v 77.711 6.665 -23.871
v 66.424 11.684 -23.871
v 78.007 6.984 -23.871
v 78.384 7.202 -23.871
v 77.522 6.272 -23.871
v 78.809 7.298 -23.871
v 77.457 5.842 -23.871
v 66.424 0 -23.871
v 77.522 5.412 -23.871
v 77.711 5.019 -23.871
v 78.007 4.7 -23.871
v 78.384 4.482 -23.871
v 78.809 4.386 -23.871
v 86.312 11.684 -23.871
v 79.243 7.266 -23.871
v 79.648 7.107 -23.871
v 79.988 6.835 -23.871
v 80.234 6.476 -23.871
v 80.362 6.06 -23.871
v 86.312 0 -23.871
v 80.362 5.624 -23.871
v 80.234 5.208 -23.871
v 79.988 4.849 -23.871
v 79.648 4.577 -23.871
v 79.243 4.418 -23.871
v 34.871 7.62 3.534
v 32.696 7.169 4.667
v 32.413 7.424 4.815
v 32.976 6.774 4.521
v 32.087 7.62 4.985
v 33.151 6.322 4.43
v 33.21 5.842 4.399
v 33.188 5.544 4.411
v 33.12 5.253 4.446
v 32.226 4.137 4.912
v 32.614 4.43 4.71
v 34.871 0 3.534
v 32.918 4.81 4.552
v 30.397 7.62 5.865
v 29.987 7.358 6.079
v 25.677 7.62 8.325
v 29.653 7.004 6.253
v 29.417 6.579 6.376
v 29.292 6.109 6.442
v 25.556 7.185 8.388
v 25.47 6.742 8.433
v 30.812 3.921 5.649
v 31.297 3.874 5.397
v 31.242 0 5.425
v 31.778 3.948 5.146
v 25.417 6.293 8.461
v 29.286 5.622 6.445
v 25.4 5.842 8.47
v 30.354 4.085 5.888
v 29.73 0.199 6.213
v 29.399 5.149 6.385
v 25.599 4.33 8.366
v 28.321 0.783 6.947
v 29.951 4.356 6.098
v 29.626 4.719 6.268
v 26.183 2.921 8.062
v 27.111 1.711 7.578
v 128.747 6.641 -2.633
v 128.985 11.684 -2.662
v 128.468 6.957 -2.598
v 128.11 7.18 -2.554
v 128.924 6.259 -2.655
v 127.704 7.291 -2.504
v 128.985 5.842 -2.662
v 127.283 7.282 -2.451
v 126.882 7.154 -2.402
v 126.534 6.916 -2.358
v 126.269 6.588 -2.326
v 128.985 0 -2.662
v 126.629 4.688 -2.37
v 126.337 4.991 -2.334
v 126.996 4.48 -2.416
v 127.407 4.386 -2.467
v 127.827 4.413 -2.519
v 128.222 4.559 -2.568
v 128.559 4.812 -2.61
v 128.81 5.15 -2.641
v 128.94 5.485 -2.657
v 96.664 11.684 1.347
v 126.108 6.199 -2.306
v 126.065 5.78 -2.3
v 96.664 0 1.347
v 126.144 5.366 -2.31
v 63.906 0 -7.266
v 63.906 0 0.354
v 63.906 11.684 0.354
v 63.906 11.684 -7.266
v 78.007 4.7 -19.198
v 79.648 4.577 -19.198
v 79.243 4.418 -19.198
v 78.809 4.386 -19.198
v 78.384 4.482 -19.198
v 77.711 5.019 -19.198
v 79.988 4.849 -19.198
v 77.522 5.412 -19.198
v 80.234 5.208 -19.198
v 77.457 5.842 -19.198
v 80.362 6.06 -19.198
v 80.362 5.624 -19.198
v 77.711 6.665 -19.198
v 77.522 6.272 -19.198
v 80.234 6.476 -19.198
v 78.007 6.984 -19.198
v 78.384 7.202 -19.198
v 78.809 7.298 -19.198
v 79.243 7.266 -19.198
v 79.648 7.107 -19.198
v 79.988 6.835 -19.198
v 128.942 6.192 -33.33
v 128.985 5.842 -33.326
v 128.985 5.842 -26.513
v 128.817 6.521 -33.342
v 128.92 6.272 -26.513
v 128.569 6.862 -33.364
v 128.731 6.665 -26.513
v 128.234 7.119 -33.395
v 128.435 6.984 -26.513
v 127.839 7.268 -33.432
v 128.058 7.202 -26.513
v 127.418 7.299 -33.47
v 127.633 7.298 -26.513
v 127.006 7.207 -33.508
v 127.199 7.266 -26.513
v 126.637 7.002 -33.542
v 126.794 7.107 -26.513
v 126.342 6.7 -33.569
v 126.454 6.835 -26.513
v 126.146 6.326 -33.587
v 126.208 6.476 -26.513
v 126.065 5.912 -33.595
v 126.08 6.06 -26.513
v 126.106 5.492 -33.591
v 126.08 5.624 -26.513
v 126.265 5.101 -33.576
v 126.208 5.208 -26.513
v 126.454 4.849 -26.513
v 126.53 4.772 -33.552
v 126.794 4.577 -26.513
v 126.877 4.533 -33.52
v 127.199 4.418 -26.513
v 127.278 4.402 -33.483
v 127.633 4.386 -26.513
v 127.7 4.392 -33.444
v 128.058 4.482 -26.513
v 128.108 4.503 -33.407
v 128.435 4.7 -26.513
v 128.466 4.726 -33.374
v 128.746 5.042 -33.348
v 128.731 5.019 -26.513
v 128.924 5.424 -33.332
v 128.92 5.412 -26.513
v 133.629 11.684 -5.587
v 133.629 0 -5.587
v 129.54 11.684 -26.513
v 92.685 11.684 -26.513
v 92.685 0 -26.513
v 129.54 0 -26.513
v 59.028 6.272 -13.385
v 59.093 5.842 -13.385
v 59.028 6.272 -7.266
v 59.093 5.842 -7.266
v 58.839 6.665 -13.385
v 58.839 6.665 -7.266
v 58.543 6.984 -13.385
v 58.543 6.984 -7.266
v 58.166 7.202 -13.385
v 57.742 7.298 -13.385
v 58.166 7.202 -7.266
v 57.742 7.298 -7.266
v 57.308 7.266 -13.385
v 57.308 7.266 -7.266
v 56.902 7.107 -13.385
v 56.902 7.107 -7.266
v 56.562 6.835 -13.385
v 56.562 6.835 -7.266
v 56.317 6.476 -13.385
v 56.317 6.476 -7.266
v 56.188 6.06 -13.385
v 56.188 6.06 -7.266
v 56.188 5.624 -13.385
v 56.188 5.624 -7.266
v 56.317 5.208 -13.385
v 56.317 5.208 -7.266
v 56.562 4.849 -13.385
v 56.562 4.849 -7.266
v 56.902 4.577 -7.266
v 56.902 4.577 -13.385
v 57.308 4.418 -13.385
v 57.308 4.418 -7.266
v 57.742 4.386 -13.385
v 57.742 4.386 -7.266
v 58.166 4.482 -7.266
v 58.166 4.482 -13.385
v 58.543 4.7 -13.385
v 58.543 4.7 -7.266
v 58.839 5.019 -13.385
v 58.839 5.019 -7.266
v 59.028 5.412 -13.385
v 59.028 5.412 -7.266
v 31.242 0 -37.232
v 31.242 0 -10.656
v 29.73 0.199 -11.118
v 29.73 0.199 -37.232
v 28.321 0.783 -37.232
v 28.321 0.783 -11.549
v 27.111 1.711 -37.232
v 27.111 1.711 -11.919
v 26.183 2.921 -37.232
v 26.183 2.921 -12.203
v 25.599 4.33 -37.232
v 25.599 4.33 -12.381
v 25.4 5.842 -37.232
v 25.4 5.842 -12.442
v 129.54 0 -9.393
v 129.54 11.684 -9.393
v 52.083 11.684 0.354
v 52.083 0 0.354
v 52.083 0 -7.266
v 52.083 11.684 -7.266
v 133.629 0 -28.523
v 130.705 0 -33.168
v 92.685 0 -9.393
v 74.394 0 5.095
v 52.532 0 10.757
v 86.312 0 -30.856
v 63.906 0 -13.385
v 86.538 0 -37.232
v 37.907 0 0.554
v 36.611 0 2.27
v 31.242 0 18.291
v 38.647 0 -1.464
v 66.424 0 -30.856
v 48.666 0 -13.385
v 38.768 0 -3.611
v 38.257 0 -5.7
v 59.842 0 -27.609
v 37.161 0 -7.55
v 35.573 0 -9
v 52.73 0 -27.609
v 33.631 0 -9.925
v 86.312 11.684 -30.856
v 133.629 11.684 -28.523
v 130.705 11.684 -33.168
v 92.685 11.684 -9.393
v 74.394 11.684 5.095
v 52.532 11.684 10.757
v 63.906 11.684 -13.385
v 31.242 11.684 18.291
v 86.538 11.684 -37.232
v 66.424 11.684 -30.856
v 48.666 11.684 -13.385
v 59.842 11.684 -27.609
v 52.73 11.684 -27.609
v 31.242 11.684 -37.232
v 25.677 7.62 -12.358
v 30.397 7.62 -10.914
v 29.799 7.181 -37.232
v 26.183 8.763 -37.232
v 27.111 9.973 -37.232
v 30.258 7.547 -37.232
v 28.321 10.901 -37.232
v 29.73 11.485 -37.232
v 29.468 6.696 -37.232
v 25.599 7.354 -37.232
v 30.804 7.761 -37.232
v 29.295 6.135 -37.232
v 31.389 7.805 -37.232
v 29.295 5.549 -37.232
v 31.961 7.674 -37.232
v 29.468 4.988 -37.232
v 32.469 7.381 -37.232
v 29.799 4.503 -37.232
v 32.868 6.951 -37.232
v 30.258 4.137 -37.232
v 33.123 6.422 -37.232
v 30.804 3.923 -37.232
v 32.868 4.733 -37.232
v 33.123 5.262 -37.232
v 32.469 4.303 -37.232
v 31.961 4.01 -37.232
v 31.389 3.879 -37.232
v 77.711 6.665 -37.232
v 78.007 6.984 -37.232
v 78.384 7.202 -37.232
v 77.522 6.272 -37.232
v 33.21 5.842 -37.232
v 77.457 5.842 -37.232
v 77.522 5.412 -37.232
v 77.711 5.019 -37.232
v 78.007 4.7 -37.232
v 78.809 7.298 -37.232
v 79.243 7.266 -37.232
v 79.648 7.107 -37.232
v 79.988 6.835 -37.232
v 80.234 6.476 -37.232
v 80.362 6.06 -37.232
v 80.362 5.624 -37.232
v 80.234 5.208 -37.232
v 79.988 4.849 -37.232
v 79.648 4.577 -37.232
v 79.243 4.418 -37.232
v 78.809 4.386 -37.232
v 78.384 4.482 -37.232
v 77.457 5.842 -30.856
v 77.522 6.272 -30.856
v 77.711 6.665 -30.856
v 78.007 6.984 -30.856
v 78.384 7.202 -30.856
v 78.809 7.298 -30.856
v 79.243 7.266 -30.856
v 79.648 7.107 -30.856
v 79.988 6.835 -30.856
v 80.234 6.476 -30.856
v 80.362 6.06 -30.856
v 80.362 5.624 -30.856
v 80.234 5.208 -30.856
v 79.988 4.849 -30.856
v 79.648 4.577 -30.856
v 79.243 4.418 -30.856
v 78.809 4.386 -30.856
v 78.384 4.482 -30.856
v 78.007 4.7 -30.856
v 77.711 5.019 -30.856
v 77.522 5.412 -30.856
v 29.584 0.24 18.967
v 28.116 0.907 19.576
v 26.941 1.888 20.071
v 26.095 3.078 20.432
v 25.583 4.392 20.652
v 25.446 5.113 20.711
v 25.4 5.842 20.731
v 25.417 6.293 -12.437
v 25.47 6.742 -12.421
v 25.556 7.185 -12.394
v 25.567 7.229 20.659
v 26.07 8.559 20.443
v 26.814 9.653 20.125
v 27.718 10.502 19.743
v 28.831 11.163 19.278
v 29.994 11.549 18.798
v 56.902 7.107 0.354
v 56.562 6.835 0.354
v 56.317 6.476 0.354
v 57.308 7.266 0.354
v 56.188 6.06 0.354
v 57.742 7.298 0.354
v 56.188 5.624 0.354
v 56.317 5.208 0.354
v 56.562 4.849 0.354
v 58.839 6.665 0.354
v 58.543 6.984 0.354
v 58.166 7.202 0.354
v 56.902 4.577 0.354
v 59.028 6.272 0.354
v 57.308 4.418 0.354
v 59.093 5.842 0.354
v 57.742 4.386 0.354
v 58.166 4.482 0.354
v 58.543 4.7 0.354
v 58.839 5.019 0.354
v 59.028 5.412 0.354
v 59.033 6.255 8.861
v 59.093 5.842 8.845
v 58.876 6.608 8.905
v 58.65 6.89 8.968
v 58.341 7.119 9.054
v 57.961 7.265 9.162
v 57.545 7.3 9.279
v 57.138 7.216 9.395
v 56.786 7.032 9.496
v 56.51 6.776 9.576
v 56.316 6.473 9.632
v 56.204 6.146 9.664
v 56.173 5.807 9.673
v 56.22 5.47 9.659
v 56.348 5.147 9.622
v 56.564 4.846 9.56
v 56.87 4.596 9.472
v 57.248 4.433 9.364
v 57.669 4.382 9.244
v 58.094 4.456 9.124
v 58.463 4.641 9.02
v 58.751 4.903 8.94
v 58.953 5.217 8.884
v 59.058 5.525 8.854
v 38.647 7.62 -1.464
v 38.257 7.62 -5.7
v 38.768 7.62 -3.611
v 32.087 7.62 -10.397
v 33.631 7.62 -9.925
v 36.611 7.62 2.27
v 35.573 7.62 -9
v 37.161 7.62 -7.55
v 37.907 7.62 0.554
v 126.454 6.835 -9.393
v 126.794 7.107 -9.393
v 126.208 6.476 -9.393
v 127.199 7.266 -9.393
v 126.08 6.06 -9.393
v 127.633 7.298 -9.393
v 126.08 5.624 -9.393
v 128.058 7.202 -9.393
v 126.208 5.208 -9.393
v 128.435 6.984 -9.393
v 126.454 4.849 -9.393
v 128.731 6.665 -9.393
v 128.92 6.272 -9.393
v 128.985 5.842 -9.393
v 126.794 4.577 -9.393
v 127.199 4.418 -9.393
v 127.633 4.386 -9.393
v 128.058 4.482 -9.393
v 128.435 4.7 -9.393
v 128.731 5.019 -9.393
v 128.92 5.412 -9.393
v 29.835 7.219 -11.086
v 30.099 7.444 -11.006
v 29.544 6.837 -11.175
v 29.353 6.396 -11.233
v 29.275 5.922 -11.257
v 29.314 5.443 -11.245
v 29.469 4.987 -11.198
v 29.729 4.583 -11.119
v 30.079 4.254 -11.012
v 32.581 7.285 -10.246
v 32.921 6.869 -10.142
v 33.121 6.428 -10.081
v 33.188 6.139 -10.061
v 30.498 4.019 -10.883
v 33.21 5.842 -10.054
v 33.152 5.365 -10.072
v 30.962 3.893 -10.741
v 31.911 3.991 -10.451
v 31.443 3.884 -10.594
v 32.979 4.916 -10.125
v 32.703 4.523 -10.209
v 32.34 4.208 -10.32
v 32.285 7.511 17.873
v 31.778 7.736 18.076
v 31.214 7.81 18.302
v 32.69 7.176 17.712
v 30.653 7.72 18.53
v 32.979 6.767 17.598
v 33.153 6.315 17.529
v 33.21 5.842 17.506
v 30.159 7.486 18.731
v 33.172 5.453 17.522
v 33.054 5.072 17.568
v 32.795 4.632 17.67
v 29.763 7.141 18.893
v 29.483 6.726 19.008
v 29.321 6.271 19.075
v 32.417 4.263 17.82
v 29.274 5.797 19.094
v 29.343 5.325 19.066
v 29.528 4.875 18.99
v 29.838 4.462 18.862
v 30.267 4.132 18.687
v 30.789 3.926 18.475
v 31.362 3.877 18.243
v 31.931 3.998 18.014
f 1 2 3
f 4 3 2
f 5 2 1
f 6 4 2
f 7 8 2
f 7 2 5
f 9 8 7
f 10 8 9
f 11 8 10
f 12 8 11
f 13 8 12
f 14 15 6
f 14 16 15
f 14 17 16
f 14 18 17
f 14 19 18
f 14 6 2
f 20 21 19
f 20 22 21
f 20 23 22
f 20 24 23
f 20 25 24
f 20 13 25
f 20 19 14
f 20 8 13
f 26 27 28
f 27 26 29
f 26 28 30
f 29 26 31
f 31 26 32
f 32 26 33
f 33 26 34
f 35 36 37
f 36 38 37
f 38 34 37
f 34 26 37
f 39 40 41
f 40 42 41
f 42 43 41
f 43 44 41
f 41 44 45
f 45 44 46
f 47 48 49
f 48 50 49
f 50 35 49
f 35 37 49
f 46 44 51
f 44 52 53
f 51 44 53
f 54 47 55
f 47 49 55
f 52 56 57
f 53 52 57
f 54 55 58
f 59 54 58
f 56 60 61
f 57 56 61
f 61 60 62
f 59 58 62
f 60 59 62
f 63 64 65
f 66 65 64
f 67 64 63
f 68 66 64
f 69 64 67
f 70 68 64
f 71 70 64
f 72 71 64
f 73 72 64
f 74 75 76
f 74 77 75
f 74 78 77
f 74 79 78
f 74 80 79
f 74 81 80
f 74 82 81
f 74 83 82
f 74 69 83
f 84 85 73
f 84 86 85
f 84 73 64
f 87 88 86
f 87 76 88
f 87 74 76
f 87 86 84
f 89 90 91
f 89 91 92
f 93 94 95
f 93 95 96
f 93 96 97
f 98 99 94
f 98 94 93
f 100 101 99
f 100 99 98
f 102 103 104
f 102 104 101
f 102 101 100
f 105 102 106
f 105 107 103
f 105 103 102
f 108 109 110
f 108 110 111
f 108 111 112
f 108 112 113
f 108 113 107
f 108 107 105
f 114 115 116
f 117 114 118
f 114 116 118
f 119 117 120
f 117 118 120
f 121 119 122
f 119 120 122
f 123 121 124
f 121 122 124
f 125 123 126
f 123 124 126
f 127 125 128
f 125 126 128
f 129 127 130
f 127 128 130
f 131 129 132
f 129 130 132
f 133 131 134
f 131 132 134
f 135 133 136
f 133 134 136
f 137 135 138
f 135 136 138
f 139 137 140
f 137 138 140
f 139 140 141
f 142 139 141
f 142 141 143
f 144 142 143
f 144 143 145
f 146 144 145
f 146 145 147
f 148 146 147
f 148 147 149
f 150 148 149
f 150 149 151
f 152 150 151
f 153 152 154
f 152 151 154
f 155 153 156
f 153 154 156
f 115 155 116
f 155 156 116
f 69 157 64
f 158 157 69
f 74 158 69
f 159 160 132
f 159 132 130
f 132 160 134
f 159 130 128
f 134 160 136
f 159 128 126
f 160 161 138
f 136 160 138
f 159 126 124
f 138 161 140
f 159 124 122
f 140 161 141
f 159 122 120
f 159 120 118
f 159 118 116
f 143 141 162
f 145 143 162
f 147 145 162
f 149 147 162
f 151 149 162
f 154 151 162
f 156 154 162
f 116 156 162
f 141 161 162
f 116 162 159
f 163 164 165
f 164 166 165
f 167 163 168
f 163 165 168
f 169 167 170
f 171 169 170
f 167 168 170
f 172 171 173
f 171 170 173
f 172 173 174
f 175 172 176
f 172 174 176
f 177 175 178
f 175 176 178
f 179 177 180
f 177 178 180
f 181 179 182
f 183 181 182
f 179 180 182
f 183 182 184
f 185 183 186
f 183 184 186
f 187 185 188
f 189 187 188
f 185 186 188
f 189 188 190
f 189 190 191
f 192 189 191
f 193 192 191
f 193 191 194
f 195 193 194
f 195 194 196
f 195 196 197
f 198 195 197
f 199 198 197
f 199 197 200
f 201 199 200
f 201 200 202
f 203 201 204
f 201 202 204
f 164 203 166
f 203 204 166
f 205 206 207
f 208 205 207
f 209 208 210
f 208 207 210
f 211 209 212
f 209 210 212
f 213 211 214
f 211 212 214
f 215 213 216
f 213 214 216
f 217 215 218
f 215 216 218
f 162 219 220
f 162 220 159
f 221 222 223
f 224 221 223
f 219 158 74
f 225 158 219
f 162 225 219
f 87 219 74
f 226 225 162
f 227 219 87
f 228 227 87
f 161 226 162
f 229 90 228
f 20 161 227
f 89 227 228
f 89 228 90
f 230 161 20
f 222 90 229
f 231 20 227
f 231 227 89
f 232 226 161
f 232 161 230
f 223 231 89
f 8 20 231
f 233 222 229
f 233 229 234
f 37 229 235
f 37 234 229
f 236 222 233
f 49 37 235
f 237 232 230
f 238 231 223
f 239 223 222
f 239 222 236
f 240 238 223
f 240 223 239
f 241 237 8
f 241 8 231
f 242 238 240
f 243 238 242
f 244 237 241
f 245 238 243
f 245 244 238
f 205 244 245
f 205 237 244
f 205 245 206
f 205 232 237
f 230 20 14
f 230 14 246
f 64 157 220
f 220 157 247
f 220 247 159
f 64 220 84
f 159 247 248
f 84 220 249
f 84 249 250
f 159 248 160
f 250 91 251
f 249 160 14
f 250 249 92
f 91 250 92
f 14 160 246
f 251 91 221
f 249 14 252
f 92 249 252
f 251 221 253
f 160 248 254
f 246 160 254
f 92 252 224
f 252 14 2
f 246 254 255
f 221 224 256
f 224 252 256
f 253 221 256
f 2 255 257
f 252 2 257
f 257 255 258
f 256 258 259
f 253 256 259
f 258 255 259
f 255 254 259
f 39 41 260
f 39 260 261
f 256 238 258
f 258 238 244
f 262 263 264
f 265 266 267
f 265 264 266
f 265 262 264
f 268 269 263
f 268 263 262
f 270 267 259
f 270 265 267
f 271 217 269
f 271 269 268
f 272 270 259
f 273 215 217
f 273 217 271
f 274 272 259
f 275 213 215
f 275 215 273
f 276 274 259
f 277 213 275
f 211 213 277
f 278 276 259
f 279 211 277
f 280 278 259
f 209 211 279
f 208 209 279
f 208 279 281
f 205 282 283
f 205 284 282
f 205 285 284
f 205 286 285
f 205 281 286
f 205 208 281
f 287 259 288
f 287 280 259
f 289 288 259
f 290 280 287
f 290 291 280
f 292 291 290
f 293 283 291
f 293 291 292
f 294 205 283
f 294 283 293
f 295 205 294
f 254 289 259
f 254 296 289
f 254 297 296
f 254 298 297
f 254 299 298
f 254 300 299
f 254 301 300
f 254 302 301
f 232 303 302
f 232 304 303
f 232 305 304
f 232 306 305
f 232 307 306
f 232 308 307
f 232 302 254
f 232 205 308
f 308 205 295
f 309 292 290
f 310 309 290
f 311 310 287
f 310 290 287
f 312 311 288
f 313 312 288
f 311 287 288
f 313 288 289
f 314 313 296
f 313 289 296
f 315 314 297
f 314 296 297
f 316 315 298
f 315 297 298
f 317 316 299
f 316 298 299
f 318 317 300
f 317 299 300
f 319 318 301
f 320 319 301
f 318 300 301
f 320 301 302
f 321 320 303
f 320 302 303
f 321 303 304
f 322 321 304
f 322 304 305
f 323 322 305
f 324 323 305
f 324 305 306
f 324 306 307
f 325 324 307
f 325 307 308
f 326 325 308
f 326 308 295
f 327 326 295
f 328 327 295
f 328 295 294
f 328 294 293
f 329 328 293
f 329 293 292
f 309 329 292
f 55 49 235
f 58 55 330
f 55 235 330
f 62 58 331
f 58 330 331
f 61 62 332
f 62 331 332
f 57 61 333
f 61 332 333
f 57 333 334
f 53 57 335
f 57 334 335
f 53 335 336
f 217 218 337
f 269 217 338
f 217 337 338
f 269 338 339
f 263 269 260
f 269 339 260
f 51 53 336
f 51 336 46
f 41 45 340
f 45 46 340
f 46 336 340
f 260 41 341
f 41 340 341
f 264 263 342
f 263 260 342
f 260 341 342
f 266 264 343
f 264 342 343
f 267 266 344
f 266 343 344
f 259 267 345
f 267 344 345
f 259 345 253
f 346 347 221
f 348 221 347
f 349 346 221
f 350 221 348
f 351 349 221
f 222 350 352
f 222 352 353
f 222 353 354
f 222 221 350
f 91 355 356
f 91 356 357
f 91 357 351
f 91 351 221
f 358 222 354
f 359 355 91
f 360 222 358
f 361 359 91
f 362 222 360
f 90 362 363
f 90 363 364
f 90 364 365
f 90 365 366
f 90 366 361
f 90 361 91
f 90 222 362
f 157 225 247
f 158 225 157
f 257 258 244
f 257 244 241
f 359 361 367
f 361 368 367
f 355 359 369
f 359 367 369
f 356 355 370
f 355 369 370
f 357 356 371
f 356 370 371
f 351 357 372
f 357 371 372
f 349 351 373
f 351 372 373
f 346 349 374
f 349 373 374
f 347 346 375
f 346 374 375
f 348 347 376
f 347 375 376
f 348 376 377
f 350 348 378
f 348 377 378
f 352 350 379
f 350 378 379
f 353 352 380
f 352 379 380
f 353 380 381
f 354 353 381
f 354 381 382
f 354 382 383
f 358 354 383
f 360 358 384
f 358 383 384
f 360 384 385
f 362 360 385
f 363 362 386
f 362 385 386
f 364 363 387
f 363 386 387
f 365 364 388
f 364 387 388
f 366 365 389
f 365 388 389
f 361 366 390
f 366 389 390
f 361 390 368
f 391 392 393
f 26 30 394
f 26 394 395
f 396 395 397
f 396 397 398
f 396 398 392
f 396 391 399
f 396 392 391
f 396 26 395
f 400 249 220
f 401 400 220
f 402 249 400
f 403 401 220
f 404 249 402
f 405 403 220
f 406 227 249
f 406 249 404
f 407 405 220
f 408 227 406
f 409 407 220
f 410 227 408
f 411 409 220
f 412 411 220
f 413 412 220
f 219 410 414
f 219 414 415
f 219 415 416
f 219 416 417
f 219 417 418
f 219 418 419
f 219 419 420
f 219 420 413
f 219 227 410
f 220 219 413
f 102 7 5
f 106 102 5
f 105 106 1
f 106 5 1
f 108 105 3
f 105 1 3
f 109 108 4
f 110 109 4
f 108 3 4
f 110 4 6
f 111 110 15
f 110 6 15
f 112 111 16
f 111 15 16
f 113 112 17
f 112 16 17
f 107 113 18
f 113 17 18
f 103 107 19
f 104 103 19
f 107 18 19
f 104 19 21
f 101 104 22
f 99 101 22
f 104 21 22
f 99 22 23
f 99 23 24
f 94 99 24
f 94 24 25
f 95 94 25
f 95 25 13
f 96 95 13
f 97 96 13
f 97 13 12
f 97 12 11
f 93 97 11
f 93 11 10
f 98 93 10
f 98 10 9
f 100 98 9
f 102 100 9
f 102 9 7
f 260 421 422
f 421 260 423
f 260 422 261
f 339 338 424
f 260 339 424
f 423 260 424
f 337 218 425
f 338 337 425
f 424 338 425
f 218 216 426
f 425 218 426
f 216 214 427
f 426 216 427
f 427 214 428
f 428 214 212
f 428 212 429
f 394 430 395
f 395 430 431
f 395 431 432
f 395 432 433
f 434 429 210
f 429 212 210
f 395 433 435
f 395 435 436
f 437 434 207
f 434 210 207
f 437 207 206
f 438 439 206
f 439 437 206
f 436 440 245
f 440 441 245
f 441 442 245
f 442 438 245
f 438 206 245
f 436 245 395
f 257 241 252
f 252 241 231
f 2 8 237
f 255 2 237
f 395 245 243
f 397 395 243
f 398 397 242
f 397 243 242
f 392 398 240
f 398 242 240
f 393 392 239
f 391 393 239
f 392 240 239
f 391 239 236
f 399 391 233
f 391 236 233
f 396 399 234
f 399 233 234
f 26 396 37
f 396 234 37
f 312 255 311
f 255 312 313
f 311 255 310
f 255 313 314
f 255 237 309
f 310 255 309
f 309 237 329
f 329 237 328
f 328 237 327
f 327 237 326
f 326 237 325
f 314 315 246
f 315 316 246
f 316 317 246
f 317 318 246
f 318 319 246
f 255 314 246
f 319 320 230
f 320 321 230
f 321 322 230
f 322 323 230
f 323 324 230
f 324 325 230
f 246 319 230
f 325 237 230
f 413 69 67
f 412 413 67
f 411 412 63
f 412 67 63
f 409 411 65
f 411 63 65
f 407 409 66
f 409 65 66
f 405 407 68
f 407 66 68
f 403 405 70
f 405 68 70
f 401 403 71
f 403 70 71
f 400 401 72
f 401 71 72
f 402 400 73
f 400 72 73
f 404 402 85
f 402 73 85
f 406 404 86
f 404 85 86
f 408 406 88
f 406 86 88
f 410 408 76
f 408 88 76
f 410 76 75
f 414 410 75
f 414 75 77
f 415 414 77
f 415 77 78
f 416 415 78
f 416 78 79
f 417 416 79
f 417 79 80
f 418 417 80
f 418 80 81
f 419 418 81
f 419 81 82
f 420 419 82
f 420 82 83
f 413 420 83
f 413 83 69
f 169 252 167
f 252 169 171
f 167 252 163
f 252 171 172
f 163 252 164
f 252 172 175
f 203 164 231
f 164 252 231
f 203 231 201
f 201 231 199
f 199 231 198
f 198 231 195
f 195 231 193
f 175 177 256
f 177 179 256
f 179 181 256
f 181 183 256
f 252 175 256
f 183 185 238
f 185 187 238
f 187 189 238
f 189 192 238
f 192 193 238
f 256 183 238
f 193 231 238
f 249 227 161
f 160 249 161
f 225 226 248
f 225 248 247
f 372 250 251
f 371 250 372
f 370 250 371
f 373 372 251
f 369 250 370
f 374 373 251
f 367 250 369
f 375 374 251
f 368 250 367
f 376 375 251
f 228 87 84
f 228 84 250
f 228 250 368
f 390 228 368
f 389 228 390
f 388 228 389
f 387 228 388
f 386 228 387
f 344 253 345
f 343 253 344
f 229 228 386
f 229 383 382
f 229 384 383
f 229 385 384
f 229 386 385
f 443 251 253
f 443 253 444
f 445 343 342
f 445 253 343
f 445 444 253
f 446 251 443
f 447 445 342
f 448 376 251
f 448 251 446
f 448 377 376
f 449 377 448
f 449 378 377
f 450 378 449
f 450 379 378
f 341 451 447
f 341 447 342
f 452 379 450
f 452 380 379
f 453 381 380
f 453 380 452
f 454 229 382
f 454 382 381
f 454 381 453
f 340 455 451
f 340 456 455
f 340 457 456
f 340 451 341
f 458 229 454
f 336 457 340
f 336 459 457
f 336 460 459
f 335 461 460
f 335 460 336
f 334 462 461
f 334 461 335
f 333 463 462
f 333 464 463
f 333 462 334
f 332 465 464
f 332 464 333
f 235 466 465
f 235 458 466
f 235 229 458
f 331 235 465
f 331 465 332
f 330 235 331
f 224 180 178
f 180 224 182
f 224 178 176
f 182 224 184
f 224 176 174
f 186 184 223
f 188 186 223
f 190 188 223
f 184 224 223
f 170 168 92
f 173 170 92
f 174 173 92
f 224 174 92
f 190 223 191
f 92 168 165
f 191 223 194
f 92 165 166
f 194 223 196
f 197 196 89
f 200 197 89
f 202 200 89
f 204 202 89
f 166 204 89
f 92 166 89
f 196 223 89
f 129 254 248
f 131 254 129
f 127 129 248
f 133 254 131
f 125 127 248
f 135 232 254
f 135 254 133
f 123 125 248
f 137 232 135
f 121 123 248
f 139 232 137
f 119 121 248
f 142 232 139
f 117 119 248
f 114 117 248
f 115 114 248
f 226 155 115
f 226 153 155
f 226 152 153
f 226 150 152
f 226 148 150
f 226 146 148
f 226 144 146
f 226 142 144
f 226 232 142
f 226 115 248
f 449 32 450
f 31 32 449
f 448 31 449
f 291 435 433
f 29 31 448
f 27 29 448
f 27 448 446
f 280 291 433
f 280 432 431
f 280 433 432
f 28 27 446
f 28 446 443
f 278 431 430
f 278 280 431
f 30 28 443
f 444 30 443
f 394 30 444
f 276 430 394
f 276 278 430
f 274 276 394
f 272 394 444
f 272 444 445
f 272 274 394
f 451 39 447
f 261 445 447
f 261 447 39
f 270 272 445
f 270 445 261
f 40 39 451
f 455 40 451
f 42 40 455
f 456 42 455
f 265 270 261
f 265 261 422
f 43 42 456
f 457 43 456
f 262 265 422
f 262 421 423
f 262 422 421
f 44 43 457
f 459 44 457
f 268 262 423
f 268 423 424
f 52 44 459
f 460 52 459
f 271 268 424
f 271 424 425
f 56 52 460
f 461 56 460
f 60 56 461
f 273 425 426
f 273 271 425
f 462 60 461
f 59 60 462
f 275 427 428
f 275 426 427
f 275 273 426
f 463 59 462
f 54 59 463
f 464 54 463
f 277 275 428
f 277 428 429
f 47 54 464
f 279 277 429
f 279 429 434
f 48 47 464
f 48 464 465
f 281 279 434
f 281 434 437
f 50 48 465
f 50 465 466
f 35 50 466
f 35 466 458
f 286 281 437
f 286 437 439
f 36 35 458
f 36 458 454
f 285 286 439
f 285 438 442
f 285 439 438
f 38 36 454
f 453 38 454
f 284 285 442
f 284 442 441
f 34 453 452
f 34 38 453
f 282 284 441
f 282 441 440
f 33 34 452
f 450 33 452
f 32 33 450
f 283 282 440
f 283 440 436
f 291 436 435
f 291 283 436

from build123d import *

# Parameters (mm, degrees)
SKETCH1_W                = 36.8554
SKETCH1_H                = 17.1196
SKETCH1_W_2              = 19.8882
SKETCH1_H_2              = 6.985
SKETCH1_W_3              = 11.8237
SKETCH1_H_3              = 7.62
BOSS_EXTRUDE1_DEPTH      = 11.684
BOSS_EXTRUDE1_2_DEPTH    = 11.684
SKETCH3_R                = 1.4605
CUT_EXTRUDE8_DEPTH       = 140.210429827
SKETCH4_R                = 1.4605
CUT_EXTRUDE9_DEPTH       = 18.034
CUT_EXTRUDE11_DEPTH      = 38.1
SKETCH6_R                = 1.4605
CUT_EXTRUDE12_DEPTH      = 16.3195
CUT_EXTRUDE13_DEPTH      = 140.210429862
CUT_EXTRUDE13_DEPTH_BACK = 140.210429862
SKETCH7_R                = 1.9685
CUT_EXTRUDE14_DEPTH      = 7.62


with BuildPart() as part:
    # Sketch1 → Boss-Extrude1 (new body)
    with BuildSketch(Plane(origin=(0, 0, 0), x_dir=(1, 0, 0), z_dir=(0, 1, 0))):
        with BuildLine():
            Line((-25.4, 37.231859639), (-67.6656, 37.231859639))
            Line((-67.6656, 37.231859639), (-86.5378, 37.231859639))
            Line((-86.5378, 37.231859639), (-130.704860186, 33.167859639))
            Line((-130.704860186, 33.167859639), (-133.6294, 28.523199453))
            Line((-133.6294, 28.523199453), (-133.6294, 5.586999453))
            Line((-133.6294, 5.586999453), (-128.984739814, 2.662459639))
            Line((-128.984739814, 2.662459639), (-96.664183529, -1.34664073))
            ThreePointArc((-96.664183529, -1.34664073), (-60.341965715, -8.501620237), (-25.4, -20.730940361))
            Line((-25.4, -20.730940361), (-25.4, 37.231859639))
        make_face()
        with Locations((-111.1123, 17.953259639)):
            Rectangle(SKETCH1_W, SKETCH1_H, mode=Mode.SUBTRACT)
        with Locations((-76.367777447, 27.363959639)):
            Rectangle(SKETCH1_W_2, SKETCH1_H_2, mode=Mode.SUBTRACT)
        with Locations((-57.99455, 3.456462042)):
            Rectangle(SKETCH1_W_3, SKETCH1_H_3, mode=Mode.SUBTRACT)
        Polygon((-63.9064, 13.384739375), (-48.6664, 13.384739375), (-52.7304, 27.608739375), (-59.8424, 27.608739375), align=None, mode=Mode.SUBTRACT)
    extrude(amount=BOSS_EXTRUDE1_DEPTH)


with BuildPart() as body_2:
    # Sketch1 → Boss-Extrude1 2 (new body)
    with BuildSketch(Plane(origin=(0, 0, 0), x_dir=(1, 0, 0), z_dir=(0, 1, 0))):
        with BuildLine():
            Line((25.4, -20.730940361), (25.4, 37.231859639))
            Line((25.4, 37.231859639), (67.6656, 37.231859639))
            Line((67.6656, 37.231859639), (86.5378, 37.231859639))
            Line((86.5378, 37.231859639), (130.704860186, 33.167859639))
            Line((130.704860186, 33.167859639), (133.6294, 28.523199453))
            Line((133.6294, 28.523199453), (133.6294, 5.586999453))
            Line((133.6294, 5.586999453), (128.984739814, 2.662459639))
            Line((128.984739814, 2.662459639), (96.664183529, -1.34664073))
            ThreePointArc((96.664183529, -1.34664073), (60.341965715, -8.501620237), (25.4, -20.730940361))
        make_face()
        Polygon((59.8424, 27.608739375), (63.9064, 13.384739375), (48.6664, 13.384739375), (52.7304, 27.608739375), align=None, mode=Mode.SUBTRACT)
        with Locations((57.99455, 3.456462042)):
            Rectangle(SKETCH1_W_3, SKETCH1_H_3, mode=Mode.SUBTRACT)
        with Locations((76.367777447, 27.363959639)):
            Rectangle(SKETCH1_W_2, SKETCH1_H_2, mode=Mode.SUBTRACT)
        with Locations((111.1123, 17.953259639)):
            Rectangle(SKETCH1_W, SKETCH1_H, mode=Mode.SUBTRACT)
    extrude(amount=BOSS_EXTRUDE1_2_DEPTH)


with BuildPart() as cut_extrude8_tool:
    # Sketch3 → Cut-Extrude8 (new, through all)
    with BuildSketch(Plane.XY):
        with Locations((-127.524239814, 5.842)):
            Circle(SKETCH3_R)
        with Locations((127.524239814, 5.842)):
            Circle(SKETCH3_R)
    extrude(amount=-CUT_EXTRUDE8_DEPTH)


with BuildPart() as part_1:
    add(part.part)

    # Cut-Extrude8: cut by cut_extrude8_tool
    add(cut_extrude8_tool.part, mode=Mode.SUBTRACT)


with BuildPart() as body_2_1:
    add(body_2.part)

    # Cut-Extrude8: cut by cut_extrude8_tool
    add(cut_extrude8_tool.part, mode=Mode.SUBTRACT)


with BuildPart() as cut_extrude9_tool:
    # Sketch4 → Cut-Extrude9 (new body)
    with BuildSketch(Plane(origin=(0, 0, -37.231859639), x_dir=(-1, 0, 0), z_dir=(0, 0, -1))):
        with Locations((78.9178, 5.842)):
            Circle(SKETCH4_R)
        with Locations((-78.9178, 5.842)):
            Circle(SKETCH4_R)
    extrude(amount=-CUT_EXTRUDE9_DEPTH)


with BuildPart() as part_2:
    add(part_1.part)

    # Cut-Extrude9: cut by cut_extrude9_tool
    add(cut_extrude9_tool.part, mode=Mode.SUBTRACT)


with BuildPart() as body_2_2:
    add(body_2_1.part)

    # Cut-Extrude9: cut by cut_extrude9_tool
    add(cut_extrude9_tool.part, mode=Mode.SUBTRACT)

    # Sketch2 → Cut-Extrude11 (cut, symmetric)
    with BuildSketch(Plane.XY):
        with BuildLine():
            Line((25.4, 5.842), (25.4, 0))
            Line((25.4, 0), (31.242, 0))
            ThreePointArc((31.242, 0), (27.111082184, 1.711082184), (25.4, 5.842))
        make_face()
        with BuildLine():
            Line((25.4, 11.684), (25.4, 5.842))
            ThreePointArc((25.4, 5.842), (27.111082184, 9.972917816), (31.242, 11.684))
            Line((31.242, 11.684), (25.4, 11.684))
        make_face()
    extrude(amount=CUT_EXTRUDE11_DEPTH, both=True, mode=Mode.SUBTRACT)

    # Sketch6 → Cut-Extrude12 (cut, symmetric)
    with BuildSketch(Plane.XY):
        with Locations((57.6326, 5.842)):
            Circle(SKETCH6_R)
    extrude(amount=CUT_EXTRUDE12_DEPTH, both=True, mode=Mode.SUBTRACT)

    # Sketch7 → Cut-Extrude13 (cut, two sides: drawn at the far end of the back side and taken through both)
    with BuildSketch(Plane.XY.offset(-CUT_EXTRUDE13_DEPTH_BACK)):
        with Locations((31.242, 5.842)):
            Circle(SKETCH7_R)
    extrude(amount=CUT_EXTRUDE13_DEPTH + CUT_EXTRUDE13_DEPTH_BACK, mode=Mode.SUBTRACT)

    # Sketch8 → Cut-Extrude14 (cut)
    with BuildSketch(Plane.XZ):
        with BuildLine():
            Line((34.870867511, 3.534001348), (24.218880791, 9.085239089))
            Line((24.218880791, 9.085239089), (24.658356534, -12.669081964))
            Line((24.658356534, -12.669081964), (33.631457802, -9.925148709))
            ThreePointArc((33.631457802, -9.925148709), (38.767733035, -3.611490076), (34.870867511, 3.534001348))
        make_face()
    extrude(amount=-CUT_EXTRUDE14_DEPTH, mode=Mode.SUBTRACT)


solid = body_2_2.part
